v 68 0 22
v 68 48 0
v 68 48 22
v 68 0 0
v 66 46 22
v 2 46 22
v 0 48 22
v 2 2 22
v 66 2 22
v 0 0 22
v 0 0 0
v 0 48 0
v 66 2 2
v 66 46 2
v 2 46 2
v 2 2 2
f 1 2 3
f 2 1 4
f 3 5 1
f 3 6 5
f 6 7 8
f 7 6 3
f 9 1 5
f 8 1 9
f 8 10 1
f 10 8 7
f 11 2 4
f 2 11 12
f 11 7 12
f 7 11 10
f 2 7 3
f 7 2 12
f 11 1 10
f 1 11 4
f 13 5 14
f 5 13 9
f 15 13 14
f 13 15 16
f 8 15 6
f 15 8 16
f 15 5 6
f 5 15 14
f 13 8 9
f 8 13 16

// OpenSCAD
// Illustrative millimeter geometry. No physical fit or print approval.
part = "box"; // box, lid, mouth_coupon, rim_coupon
cavity_length = 64;
cavity_width = 44;
cavity_height = 20;
wall = 2;
floor_thickness = 2;
lid_thickness = 2;
rim_wall = 2;
rim_depth = 3;
clearance_per_side = 0.30; // experiment; try 0.15, 0.30, 0.45 separately
coupon_height = 6;
epsilon = 0.01;
outer_length = cavity_length + 2*wall;
outer_width = cavity_width + 2*wall;
rim_length = cavity_length - 2*clearance_per_side;
rim_width = cavity_width - 2*clearance_per_side;
assert(part=="box" || part=="lid" || part=="mouth_coupon" || part=="rim_coupon", "Unknown part");
assert(min(cavity_length,cavity_width,cavity_height,wall,floor_thickness,lid_thickness,rim_wall,rim_depth)>0, "Dimensions must be positive");
assert(clearance_per_side>=0 && min(rim_length,rim_width)>2*rim_wall, "Rim must retain an open center");
assert(coupon_height>=rim_depth && coupon_height<=cavity_height, "Coupon must preserve rim engagement");
module ring(length,width,thickness,height) {
    difference() {
        cube([length,width,height]);
        translate([thickness,thickness,-epsilon]) cube([length-2*thickness,width-2*thickness,height+2*epsilon]);
    }
}
module rim() {
    translate([wall+clearance_per_side,wall+clearance_per_side,0])
        ring(rim_length,rim_width,rim_wall,rim_depth);
}
if (part=="box") difference() {
    cube([outer_length,outer_width,cavity_height+floor_thickness]);
    translate([wall,wall,floor_thickness]) cube([cavity_length,cavity_width,cavity_height+epsilon]);
}
if (part=="lid") union() {
    cube([outer_length,outer_width,lid_thickness]);
    translate([0,0,lid_thickness-epsilon]) scale([1,1,(rim_depth+epsilon)/rim_depth]) rim();
}
if (part=="mouth_coupon") ring(outer_length,outer_width,wall,coupon_height);
// Thin perimeter backing preserves fit while omitting the full lid center.
if (part=="rim_coupon") union() {
    ring(outer_length,outer_width,wall+clearance_per_side+rim_wall,lid_thickness);
    translate([0,0,lid_thickness-epsilon]) scale([1,1,(rim_depth+epsilon)/rim_depth]) rim();
}
